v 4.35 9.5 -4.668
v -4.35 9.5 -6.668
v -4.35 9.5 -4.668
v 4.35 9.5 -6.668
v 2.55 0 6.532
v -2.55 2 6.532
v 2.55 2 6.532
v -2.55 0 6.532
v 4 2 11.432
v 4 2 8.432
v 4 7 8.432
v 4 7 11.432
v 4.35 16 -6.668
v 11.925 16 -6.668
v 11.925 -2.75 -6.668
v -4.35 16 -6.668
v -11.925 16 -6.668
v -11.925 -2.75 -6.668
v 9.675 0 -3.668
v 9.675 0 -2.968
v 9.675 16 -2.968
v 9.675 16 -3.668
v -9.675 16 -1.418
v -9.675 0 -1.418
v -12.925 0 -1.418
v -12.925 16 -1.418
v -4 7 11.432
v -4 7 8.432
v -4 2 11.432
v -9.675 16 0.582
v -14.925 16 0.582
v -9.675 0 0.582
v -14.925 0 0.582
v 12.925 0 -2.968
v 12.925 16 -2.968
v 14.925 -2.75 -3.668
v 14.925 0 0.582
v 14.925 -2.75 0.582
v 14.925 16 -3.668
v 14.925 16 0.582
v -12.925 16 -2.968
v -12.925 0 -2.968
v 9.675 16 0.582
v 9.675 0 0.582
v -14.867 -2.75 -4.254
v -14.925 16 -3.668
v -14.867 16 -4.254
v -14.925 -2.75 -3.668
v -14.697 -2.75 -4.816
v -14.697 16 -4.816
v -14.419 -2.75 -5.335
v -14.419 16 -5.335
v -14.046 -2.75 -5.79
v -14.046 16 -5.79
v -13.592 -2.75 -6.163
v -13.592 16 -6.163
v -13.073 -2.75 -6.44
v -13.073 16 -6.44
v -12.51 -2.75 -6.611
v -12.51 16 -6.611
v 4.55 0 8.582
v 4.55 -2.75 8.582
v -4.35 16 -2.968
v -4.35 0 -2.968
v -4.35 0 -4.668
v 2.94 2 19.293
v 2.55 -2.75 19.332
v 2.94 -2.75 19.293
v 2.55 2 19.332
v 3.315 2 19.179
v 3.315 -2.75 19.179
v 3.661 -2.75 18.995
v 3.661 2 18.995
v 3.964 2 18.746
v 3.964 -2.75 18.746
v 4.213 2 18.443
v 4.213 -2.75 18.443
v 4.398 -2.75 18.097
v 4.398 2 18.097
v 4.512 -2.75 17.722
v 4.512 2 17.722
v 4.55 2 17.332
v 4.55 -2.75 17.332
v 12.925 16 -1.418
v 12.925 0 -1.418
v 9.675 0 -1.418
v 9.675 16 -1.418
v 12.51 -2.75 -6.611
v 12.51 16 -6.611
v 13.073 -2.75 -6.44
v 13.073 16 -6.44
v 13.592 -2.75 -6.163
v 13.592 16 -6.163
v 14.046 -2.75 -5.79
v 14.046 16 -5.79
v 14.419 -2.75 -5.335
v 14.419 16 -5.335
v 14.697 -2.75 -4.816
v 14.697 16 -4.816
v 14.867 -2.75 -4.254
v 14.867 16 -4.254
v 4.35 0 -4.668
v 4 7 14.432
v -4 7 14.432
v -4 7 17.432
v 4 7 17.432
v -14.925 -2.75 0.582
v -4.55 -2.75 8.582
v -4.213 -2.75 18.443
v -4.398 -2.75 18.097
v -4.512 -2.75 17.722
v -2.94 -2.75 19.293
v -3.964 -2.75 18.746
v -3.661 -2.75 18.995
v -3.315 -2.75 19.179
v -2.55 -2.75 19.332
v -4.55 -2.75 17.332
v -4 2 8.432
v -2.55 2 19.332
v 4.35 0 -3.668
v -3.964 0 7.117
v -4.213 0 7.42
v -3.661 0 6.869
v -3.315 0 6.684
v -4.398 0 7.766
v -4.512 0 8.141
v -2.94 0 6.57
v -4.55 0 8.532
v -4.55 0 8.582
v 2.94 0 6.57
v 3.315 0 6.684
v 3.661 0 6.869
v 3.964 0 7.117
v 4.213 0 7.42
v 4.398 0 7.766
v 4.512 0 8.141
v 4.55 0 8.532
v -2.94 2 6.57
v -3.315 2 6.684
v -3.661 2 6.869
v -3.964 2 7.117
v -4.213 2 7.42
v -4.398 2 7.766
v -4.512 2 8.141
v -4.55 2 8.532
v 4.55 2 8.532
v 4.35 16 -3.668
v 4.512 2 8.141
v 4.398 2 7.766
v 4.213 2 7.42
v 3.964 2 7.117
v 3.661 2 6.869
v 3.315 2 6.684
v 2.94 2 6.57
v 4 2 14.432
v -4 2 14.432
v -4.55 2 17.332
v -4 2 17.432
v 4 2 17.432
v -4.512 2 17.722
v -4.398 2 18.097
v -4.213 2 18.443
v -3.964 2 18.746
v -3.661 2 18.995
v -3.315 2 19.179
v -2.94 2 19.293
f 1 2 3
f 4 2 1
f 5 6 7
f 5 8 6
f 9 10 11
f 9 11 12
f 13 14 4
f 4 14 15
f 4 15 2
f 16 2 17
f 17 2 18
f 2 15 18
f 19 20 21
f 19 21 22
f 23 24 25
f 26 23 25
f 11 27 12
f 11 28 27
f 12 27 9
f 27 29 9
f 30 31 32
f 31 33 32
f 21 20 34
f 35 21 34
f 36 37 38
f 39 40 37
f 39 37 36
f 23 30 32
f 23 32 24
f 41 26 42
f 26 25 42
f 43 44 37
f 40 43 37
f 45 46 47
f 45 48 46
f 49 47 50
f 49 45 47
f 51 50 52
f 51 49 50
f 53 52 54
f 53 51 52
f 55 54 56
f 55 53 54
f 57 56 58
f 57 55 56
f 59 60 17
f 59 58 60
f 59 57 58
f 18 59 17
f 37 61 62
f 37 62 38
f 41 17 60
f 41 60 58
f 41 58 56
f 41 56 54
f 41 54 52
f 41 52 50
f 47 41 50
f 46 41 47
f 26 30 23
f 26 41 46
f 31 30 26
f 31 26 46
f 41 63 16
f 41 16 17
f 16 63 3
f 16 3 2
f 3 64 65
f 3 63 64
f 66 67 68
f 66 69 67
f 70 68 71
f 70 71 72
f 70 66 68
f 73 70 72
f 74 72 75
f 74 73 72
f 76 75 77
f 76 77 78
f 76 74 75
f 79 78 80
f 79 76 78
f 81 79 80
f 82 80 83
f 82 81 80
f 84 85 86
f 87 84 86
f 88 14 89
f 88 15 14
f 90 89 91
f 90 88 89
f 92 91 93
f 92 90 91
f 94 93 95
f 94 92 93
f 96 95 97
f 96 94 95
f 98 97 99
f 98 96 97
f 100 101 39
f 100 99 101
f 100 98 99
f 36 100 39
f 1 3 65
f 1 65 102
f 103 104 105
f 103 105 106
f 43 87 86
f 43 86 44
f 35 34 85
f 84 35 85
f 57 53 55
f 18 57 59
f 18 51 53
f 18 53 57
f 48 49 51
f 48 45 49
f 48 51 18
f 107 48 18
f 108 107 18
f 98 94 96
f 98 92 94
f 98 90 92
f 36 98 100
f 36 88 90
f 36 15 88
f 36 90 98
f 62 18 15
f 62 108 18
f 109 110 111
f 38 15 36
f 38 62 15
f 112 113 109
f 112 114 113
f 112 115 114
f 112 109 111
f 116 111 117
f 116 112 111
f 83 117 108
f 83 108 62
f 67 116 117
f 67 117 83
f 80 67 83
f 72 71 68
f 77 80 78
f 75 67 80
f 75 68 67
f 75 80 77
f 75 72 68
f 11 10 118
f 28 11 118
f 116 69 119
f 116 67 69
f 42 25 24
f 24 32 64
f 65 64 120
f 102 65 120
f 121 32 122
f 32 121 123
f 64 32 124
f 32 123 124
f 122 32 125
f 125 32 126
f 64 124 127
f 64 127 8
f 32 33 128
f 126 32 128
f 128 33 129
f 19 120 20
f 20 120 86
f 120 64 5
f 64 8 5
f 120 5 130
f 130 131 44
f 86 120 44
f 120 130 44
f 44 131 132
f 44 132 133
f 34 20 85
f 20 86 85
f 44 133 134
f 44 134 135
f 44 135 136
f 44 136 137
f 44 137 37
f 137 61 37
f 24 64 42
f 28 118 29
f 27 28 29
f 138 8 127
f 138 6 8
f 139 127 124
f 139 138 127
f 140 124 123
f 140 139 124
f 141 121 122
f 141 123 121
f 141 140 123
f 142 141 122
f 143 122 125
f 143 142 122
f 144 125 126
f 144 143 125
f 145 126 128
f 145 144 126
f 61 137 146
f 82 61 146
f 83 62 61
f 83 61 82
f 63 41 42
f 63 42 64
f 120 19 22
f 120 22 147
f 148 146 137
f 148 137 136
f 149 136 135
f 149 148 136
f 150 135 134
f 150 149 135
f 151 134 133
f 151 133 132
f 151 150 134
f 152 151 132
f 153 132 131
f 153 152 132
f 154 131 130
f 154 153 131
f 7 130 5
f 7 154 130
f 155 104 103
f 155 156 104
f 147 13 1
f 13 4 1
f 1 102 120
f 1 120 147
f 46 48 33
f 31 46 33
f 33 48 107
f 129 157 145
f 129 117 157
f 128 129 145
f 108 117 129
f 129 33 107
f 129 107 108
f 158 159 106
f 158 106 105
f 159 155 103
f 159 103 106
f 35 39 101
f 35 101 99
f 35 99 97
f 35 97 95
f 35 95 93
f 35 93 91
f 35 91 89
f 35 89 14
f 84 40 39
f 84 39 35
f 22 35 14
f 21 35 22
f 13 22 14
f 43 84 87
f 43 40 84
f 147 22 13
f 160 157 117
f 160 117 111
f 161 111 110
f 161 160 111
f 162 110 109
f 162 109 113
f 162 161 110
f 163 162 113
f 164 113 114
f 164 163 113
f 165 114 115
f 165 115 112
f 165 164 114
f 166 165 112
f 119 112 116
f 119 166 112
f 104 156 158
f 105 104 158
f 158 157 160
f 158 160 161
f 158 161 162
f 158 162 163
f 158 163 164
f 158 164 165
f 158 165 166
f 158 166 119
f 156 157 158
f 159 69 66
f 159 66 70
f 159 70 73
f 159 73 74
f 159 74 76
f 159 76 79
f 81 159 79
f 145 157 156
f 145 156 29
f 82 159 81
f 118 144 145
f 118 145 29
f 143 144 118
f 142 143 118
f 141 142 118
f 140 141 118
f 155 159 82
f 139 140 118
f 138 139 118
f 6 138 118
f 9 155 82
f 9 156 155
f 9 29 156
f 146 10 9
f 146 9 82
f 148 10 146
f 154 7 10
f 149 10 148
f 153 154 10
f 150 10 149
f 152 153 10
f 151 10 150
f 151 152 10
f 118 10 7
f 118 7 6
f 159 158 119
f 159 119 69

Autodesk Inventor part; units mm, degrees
ref_plane "YZ Plane" through (0, 0, 0) normal (1, 0, 0) x (0, 1, 0)
ref_plane "XZ Plane" through (0, 0, 0) normal (0, 1, 0) x (-1, 0, 0)
ref_plane "XY Plane" through (0, 0, 0) normal (0, 0, 1) x (1, 0, 0)
sketch "Sketch2" plane through (0, 0, 0) normal (0, 1, 0) x (-1, 0, 0)
  line L0 (16, -6.6684) -> (16, 6.6684)
  line L1 (9.675, -1.4184) -> (12.925, -1.4184)
  line L2 (12.925, -1.4184) -> (12.925, -2.9684)
  line L3 (12.925, -2.9684) -> (4.35, -2.9684)
  line L4 (4.35, -2.9684) -> (4.35, -4.6684)
  line L5 (4.35, -4.6684) -> (-4.35, -4.6684)
  line L6 (-4.35, -4.6684) -> (-4.35, -3.6684)
  line L7 (-9.675, -2.9684) -> (-12.925, -2.9684)
  line L8 (-12.925, -2.9684) -> (-12.925, -1.4184)
  line L9 (-12.925, -1.4184) -> (-9.675, -1.4184)
  line L10 (-9.675, -1.4184) -> (-9.675, 0.5816)
  line L11 (-9.675, 0.5816) -> (-14.925, 0.5816)
  line L12 (-14.925, 0.5816) -> (-14.925, -6.6684)
  line L13 (14.925, -6.6684) -> (14.925, 0.5816)
  line L14 (14.925, 0.5816) -> (9.675, 0.5816)
  line L15 (9.675, 0.5816) -> (9.675, -1.4184)
  line L16 (-9.675, -2.9684) -> (-9.675, -3.6684)
  line L17 (-9.675, -3.6684) -> (-4.35, -3.6684)
  line L18 (-16, -6.6684) -> (16, -6.6684)
  line L19 (0, 0) -> (0, -6.6684) construction
  dimension "d2" = 25.25
  dimension "d5" = 0.95
  dimension "d11" = 0.7
  dimension "d13" = 2
  dimension "d14" = 2
  dimension "d16" = 1.1
  dimension "d22" = 8.1
  dimension "d23" = 3.25
  dimension "d24" = 2
extrude "Extrusion2" add sketch "Sketch2" along normal blind 16
sketch "Sketch4" plane through (0, 16, 0) normal (0, 1, 0) x (1, 0, 0)
  line L0 (-4.35, 4.6684) -> (4.35, 4.6684) projected
  line L1 (14.925, 6.6684) -> (-14.925, 6.6684) projected
  line L2 (-4.35, 4.6684) -> (-4.35, 6.6684)
  line L3 (4.35, 4.6684) -> (4.35, 6.6684)
  point P0 (0, 0)
extrude "Extrusion4" cut sketch "Sketch4" against normal blind 6.5
sketch "Sketch5" plane through (0, 0, 0) normal (0, -1, 0) x (1, 0, 0)
  line L0 (-9.675, -1.4184) -> (-12.925, -1.4184) projected
  line L1 (-9.675, 0.5816) -> (-9.675, -1.4184) projected
  line L2 (-14.925, 0.5816) -> (-9.675, 0.5816) projected
  line L3 (-14.925, -6.6684) -> (-14.925, 0.5816) projected
  line L4 (14.925, -6.6684) -> (-14.925, -6.6684) projected
  line L5 (14.925, 0.5816) -> (14.925, -6.6684) projected
  line L6 (9.675, 0.5816) -> (14.925, 0.5816) projected
  line L7 (9.675, -1.4184) -> (9.675, 0.5816) projected
  line L8 (12.925, -1.4184) -> (9.675, -1.4184) projected
  line L9 (12.925, -2.9684) -> (12.925, -1.4184) projected
  line L10 (9.675, -2.9684) -> (12.925, -2.9684) projected
  line L11 (9.675, -3.6684) -> (9.675, -2.9684) projected
  line L12 (4.35, -3.6684) -> (9.675, -3.6684) projected
  line L13 (4.35, -4.6684) -> (4.35, -3.6684) projected
  line L14 (-4.35, -4.6684) -> (4.35, -4.6684) projected
  line L15 (-4.35, -2.9684) -> (-4.35, -4.6684) projected
  line L16 (-12.925, -2.9684) -> (-4.35, -2.9684) projected
  line L17 (-12.925, -1.4184) -> (-12.925, -2.9684) projected
  line L18 (-14.925, 0.5816) -> (-4.55, 8.5816)
  line L19 (-4.55, 8.5816) -> (-4.55, 19.3316)
  line L20 (-4.55, 19.3316) -> (4.55, 19.3316)
  line L21 (4.55, 19.3316) -> (4.55, 8.5816)
  line L22 (4.55, 8.5816) -> (14.925, 0.5816)
  line L23 (0, -6.6684) -> (0, 19.3316) construction
  point P0 (0, 0)
  dimension "d27" = 9.5
  dimension "d28" = 26
  dimension "d29" = 8
extrude "Extrusion5" add sketch "Sketch5" along normal blind 2.75
sketch "Sketch6" plane through (0, 0, 0) normal (0, 1, 0) x (1, 0, 0)
  line L0 (-4.55, -19.3316) -> (-4.55, -8.5816) projected
  line L1 (4.55, -19.3316) -> (-4.55, -19.3316) projected
  line L2 (4.55, -8.5816) -> (4.55, -19.3316) projected
  line L3 (-4.55, -8.5816) -> (-4.55, -6.5316)
  line L4 (-4.55, -6.5316) -> (4.55, -6.5316)
  line L5 (4.55, -6.5316) -> (4.55, -8.5816)
  point P0 (0, 0)
  dimension "d32" = 13.2
extrude "Extrusion6" add sketch "Sketch6" along normal blind 2
fillet "Fillet1" radius 2 4 edges at (-4.55, 1, 6.5316) (4.55, 1, 6.5316) (-4.55, -0.375, 19.3316) (4.55, -0.375, 19.3316)
sketch "Sketch7" plane through (0, 2, 0) normal (0, 1, 0) x (1, 0, 0)
  line L0 (4.55, -17.3316) -> (4.55, -8.5316) projected
  line L1 (2.55, -6.5316) -> (-2.55, -6.5316) projected
  line L2 (-4.55, -8.5316) -> (-4.55, -17.3316) projected
  line L3 (-2.55, -19.3316) -> (2.55, -19.3316) projected
  line L4 (-4, -11.4316) -> (4, -11.4316)
  line L5 (4, -8.4316) -> (-4, -8.4316)
  line L6 (-4, -14.4316) -> (4, -14.4316)
  line L7 (4, -17.4316) -> (-4, -17.4316)
  line L8 (-4.55, -12.9316) -> (4.55, -12.9316) construction
  line L9 (0, -6.5316) -> (0, -19.3316) construction
  line L10 (-4, -8.4316) -> (-4, -11.4316)
  line L11 (-4, -14.4316) -> (-4, -17.4316)
  line L12 (4, -8.4316) -> (4, -11.4316)
  line L13 (4, -14.4316) -> (4, -17.4316)
  point P0 (0, 0)
  dimension "d36" = 3
  dimension "d37" = 3
  dimension "d38" = 3
  dimension "d39" = 8
extrude "Extrusion7" add sketch "Sketch7" along normal blind 5
fillet "Fillet2" radius 3 2 edges at (14.925, 6.625, -6.6684) (-14.925, 6.625, -6.6684)
equation "\"d13\" = d14"
properties part number "PiCam Holder"
